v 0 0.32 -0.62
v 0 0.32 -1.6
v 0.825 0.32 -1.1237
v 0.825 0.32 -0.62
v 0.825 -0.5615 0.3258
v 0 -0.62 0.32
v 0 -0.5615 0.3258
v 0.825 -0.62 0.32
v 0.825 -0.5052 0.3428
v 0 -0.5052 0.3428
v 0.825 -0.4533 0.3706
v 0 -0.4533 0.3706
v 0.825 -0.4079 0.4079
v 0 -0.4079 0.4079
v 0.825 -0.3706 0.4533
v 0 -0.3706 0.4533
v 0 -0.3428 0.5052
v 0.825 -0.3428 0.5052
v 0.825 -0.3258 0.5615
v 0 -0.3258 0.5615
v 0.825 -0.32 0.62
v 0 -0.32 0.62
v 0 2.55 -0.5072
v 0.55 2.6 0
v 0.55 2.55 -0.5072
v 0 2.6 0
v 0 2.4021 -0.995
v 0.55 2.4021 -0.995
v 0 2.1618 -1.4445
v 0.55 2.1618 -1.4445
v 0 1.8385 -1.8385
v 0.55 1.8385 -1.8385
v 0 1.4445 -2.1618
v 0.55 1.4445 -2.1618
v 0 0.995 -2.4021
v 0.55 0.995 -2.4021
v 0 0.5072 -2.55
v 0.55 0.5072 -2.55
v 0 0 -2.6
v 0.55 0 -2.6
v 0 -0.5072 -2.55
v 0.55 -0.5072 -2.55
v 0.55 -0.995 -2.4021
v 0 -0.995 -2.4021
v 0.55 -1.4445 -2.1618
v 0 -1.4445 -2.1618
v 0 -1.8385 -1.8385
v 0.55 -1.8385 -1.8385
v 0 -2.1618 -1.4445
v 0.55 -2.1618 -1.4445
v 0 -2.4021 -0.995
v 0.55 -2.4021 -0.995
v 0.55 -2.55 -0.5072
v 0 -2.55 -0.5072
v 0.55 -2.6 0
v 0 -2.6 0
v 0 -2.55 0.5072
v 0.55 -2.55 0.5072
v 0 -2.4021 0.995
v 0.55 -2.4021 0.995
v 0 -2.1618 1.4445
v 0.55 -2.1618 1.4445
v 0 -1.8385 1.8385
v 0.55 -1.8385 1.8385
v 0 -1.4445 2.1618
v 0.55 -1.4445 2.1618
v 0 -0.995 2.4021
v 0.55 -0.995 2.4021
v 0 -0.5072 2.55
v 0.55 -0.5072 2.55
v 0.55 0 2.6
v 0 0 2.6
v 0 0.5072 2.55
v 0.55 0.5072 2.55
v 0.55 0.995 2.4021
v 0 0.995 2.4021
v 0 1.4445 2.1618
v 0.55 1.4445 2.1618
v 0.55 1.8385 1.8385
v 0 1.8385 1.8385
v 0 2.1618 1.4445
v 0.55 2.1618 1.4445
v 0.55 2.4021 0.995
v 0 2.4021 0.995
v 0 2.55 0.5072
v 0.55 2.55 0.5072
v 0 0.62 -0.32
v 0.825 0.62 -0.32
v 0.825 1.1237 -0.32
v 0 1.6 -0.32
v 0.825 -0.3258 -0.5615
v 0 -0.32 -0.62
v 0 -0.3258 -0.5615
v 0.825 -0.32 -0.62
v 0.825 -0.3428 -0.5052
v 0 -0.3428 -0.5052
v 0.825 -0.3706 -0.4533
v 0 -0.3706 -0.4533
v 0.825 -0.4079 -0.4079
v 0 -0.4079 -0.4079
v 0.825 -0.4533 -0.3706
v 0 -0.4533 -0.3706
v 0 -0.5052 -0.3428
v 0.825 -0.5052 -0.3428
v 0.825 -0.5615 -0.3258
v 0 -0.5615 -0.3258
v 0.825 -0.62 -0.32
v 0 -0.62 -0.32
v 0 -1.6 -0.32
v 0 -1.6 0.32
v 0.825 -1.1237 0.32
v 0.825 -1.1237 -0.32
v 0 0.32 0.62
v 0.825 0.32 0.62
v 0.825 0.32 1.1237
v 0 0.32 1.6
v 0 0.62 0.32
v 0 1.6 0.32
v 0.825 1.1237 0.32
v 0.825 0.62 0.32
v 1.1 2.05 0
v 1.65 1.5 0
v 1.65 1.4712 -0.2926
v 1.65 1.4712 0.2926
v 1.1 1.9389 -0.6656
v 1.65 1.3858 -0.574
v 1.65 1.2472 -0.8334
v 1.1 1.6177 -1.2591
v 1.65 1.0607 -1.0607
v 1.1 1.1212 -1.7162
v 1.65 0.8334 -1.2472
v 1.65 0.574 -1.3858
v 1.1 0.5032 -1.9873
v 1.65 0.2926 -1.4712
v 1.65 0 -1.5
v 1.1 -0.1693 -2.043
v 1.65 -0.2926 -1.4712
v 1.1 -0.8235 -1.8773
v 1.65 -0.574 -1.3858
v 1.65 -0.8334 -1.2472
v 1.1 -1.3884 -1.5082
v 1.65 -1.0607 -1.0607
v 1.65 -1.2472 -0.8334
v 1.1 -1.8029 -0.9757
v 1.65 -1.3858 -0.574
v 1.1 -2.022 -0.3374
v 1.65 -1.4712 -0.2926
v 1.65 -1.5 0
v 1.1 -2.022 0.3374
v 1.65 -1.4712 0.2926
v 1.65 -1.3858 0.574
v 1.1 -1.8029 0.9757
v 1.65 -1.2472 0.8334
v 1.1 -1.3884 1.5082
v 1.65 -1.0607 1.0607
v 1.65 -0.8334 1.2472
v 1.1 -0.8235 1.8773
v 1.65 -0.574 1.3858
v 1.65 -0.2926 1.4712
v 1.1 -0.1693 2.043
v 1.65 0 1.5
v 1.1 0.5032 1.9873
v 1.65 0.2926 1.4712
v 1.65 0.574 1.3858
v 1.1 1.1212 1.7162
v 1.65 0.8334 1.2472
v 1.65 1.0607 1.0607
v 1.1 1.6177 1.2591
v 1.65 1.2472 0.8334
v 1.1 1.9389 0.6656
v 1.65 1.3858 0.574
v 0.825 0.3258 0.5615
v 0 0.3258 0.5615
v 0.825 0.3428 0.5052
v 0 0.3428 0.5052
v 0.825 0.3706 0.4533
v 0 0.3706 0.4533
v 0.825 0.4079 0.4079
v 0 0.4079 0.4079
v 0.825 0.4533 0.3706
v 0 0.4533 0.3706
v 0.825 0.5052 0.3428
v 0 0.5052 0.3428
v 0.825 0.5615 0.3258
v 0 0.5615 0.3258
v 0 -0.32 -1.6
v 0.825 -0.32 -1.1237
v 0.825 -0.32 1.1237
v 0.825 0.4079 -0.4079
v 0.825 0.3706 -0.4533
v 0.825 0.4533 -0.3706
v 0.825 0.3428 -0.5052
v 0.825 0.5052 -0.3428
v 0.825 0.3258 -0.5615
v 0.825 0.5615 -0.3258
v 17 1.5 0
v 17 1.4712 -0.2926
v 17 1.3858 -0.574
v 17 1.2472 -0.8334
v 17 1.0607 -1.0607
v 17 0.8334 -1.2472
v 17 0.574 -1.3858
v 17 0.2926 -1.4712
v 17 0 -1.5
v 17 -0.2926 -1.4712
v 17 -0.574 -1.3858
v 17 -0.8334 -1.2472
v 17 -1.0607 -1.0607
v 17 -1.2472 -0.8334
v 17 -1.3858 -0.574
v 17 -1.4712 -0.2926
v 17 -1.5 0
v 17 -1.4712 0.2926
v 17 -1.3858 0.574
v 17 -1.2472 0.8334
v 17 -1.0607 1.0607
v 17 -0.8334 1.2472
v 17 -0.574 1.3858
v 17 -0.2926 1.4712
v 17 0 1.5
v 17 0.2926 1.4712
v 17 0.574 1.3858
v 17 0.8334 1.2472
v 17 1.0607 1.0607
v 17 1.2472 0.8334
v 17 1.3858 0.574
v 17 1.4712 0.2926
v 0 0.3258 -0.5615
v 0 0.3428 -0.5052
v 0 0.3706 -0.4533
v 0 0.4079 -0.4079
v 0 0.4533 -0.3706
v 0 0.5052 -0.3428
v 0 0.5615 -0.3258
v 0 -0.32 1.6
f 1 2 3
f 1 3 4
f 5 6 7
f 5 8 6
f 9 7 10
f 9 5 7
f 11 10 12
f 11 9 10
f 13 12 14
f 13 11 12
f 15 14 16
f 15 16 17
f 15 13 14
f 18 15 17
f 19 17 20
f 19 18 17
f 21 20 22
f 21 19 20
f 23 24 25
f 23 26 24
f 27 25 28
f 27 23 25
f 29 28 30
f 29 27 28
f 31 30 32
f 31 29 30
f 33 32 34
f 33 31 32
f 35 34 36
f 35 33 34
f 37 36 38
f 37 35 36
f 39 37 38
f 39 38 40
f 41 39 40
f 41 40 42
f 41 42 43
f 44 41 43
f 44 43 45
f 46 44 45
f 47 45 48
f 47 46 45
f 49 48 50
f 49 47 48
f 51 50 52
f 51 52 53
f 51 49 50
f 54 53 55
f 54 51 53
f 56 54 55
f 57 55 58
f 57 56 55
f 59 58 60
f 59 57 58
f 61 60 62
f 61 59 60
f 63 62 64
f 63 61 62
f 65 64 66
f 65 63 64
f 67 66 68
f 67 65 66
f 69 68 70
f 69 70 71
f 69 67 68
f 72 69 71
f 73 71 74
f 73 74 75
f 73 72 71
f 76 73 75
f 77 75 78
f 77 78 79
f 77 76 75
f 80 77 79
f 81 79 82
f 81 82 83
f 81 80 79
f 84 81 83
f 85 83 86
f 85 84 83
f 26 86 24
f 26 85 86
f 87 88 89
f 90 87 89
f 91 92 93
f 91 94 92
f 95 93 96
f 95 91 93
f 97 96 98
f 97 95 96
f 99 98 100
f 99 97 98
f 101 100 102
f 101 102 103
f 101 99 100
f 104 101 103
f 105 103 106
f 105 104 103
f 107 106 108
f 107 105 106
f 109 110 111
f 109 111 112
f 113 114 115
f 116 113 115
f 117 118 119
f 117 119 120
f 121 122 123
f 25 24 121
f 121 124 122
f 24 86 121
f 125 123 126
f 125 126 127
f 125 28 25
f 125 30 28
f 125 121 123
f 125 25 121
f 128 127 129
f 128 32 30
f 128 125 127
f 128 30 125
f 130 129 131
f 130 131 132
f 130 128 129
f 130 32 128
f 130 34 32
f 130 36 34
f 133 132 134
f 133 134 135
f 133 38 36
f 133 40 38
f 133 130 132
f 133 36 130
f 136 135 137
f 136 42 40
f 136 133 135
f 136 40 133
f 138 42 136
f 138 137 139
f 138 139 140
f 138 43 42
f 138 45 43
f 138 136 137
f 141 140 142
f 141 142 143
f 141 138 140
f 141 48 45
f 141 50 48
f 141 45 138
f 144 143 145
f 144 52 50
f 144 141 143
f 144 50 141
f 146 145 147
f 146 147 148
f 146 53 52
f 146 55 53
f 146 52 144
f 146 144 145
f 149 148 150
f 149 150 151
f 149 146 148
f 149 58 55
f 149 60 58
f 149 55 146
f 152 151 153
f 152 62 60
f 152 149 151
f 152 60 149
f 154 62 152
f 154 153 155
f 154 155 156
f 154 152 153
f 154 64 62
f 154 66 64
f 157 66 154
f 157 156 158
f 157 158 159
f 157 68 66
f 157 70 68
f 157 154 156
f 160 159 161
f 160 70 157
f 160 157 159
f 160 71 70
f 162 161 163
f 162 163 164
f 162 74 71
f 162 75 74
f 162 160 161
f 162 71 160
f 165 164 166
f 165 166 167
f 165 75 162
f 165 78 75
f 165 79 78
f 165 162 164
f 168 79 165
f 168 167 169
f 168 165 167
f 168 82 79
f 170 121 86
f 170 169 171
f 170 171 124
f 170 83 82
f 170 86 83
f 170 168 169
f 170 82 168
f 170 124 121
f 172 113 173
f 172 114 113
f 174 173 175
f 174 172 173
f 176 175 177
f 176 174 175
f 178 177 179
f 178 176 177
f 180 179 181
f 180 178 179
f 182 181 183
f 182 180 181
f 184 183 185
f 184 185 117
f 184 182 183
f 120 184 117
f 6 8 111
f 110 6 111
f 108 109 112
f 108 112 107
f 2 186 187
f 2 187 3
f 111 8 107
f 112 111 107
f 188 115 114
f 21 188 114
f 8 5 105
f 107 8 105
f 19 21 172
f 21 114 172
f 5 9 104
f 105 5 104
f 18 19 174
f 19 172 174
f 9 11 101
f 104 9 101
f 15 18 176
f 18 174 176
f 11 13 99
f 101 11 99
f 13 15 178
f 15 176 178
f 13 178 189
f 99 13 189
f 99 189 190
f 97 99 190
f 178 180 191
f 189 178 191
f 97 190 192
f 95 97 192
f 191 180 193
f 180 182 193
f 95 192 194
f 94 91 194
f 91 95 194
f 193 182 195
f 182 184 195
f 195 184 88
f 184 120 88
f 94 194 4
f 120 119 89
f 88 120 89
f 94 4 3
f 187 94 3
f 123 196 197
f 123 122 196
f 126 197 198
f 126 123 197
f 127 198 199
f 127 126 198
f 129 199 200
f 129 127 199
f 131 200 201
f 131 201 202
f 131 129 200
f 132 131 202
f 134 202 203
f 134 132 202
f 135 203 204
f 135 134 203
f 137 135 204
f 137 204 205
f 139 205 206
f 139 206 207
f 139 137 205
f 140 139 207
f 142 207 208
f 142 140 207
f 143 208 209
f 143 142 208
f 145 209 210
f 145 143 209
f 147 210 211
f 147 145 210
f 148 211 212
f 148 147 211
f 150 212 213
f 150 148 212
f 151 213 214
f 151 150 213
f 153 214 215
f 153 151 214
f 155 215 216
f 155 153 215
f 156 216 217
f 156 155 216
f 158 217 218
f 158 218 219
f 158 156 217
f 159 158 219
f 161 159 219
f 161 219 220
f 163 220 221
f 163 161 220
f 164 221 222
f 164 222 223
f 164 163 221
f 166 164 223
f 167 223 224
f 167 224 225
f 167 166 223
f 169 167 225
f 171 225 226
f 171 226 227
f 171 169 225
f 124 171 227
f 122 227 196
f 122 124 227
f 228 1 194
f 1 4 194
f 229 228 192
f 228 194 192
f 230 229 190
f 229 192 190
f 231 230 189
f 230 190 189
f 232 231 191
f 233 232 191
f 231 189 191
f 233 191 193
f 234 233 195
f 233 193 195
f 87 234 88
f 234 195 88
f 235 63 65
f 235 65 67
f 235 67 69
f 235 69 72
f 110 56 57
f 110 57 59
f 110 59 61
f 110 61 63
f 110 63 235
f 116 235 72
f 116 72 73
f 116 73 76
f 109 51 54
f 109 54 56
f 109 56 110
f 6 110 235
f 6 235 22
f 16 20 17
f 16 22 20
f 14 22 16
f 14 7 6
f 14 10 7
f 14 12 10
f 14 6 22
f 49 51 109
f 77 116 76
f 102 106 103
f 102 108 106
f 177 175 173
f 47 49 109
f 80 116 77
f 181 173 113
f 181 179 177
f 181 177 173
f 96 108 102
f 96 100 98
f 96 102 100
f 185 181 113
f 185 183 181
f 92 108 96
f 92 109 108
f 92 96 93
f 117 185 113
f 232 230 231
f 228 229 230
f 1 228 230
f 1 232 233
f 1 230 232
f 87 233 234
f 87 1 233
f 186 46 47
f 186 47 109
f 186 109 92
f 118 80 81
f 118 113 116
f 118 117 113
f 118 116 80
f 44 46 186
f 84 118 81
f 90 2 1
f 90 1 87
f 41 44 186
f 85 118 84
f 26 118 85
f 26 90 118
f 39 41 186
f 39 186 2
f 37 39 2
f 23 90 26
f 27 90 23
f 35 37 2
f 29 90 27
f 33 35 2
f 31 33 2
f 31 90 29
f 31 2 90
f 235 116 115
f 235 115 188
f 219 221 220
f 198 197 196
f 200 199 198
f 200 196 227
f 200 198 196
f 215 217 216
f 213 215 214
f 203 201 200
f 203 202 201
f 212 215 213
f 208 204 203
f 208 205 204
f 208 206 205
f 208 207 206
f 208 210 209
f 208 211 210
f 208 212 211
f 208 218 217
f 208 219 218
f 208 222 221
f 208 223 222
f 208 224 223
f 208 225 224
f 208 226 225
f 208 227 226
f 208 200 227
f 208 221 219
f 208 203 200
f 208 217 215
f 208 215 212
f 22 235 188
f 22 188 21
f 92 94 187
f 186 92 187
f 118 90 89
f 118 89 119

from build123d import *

# Parameters (mm, degrees)
CROSSRECESS_DEPTH = 0.825
DRAFT9_ANGLE      = 30
FILLET5_R         = 0.3


with BuildPart() as part:
    # Sketch1 → Base (revolve)
    with BuildSketch(Plane.XY):
        Polygon((17, 1.5), (2.65, 1.5), (1.65, 1.5), (0.55, 2.6), (0, 2.6), (0, 0), (17, 0), align=None)
    revolve(axis=Axis((4.515812911, 0, 0), (-1, 0, 0)))

    # Sketch6 → CrossRecess (cut)
    with BuildSketch(Plane(origin=(0, 0, 0), x_dir=(0, 0, -1), z_dir=(1, 0, 0))):
        Polygon((0.32, 0.32), (0.32, 1.6), (-0.32, 1.6), (-0.32, 0.32), (-1.6, 0.32), (-1.6, -0.32), (-0.32, -0.32), (-0.32, -1.6), (0.32, -1.6), (0.32, -0.32), (1.6, -0.32), (1.6, 0.32), align=None)
    extrude(amount=CROSSRECESS_DEPTH, mode=Mode.SUBTRACT)

    # Draft9
    draft9_faces = [part.faces().sort_by_distance(p)[0] for p in [
        (0.4125, 1.6, 0),
        (0.4125, 0, 1.6),
        (0.4125, -1.6, 0),
        (0.4125, 0, -1.6),
    ]]
    draft(draft9_faces, Plane(origin=(0, 2.6, 0), x_dir=(0, 0, -1), z_dir=(-1, 0, 0)), DRAFT9_ANGLE)

    # Fillet5
    fillet5_edges = [part.edges().sort_by_distance(p)[0] for p in [
        (0.4125, 0.32, 0.32),
        (0.4125, -0.32, 0.32),
        (0.4125, -0.32, -0.32),
        (0.4125, 0.32, -0.32),
    ]]
    fillet(fillet5_edges, radius=FILLET5_R)


solid = part.part
